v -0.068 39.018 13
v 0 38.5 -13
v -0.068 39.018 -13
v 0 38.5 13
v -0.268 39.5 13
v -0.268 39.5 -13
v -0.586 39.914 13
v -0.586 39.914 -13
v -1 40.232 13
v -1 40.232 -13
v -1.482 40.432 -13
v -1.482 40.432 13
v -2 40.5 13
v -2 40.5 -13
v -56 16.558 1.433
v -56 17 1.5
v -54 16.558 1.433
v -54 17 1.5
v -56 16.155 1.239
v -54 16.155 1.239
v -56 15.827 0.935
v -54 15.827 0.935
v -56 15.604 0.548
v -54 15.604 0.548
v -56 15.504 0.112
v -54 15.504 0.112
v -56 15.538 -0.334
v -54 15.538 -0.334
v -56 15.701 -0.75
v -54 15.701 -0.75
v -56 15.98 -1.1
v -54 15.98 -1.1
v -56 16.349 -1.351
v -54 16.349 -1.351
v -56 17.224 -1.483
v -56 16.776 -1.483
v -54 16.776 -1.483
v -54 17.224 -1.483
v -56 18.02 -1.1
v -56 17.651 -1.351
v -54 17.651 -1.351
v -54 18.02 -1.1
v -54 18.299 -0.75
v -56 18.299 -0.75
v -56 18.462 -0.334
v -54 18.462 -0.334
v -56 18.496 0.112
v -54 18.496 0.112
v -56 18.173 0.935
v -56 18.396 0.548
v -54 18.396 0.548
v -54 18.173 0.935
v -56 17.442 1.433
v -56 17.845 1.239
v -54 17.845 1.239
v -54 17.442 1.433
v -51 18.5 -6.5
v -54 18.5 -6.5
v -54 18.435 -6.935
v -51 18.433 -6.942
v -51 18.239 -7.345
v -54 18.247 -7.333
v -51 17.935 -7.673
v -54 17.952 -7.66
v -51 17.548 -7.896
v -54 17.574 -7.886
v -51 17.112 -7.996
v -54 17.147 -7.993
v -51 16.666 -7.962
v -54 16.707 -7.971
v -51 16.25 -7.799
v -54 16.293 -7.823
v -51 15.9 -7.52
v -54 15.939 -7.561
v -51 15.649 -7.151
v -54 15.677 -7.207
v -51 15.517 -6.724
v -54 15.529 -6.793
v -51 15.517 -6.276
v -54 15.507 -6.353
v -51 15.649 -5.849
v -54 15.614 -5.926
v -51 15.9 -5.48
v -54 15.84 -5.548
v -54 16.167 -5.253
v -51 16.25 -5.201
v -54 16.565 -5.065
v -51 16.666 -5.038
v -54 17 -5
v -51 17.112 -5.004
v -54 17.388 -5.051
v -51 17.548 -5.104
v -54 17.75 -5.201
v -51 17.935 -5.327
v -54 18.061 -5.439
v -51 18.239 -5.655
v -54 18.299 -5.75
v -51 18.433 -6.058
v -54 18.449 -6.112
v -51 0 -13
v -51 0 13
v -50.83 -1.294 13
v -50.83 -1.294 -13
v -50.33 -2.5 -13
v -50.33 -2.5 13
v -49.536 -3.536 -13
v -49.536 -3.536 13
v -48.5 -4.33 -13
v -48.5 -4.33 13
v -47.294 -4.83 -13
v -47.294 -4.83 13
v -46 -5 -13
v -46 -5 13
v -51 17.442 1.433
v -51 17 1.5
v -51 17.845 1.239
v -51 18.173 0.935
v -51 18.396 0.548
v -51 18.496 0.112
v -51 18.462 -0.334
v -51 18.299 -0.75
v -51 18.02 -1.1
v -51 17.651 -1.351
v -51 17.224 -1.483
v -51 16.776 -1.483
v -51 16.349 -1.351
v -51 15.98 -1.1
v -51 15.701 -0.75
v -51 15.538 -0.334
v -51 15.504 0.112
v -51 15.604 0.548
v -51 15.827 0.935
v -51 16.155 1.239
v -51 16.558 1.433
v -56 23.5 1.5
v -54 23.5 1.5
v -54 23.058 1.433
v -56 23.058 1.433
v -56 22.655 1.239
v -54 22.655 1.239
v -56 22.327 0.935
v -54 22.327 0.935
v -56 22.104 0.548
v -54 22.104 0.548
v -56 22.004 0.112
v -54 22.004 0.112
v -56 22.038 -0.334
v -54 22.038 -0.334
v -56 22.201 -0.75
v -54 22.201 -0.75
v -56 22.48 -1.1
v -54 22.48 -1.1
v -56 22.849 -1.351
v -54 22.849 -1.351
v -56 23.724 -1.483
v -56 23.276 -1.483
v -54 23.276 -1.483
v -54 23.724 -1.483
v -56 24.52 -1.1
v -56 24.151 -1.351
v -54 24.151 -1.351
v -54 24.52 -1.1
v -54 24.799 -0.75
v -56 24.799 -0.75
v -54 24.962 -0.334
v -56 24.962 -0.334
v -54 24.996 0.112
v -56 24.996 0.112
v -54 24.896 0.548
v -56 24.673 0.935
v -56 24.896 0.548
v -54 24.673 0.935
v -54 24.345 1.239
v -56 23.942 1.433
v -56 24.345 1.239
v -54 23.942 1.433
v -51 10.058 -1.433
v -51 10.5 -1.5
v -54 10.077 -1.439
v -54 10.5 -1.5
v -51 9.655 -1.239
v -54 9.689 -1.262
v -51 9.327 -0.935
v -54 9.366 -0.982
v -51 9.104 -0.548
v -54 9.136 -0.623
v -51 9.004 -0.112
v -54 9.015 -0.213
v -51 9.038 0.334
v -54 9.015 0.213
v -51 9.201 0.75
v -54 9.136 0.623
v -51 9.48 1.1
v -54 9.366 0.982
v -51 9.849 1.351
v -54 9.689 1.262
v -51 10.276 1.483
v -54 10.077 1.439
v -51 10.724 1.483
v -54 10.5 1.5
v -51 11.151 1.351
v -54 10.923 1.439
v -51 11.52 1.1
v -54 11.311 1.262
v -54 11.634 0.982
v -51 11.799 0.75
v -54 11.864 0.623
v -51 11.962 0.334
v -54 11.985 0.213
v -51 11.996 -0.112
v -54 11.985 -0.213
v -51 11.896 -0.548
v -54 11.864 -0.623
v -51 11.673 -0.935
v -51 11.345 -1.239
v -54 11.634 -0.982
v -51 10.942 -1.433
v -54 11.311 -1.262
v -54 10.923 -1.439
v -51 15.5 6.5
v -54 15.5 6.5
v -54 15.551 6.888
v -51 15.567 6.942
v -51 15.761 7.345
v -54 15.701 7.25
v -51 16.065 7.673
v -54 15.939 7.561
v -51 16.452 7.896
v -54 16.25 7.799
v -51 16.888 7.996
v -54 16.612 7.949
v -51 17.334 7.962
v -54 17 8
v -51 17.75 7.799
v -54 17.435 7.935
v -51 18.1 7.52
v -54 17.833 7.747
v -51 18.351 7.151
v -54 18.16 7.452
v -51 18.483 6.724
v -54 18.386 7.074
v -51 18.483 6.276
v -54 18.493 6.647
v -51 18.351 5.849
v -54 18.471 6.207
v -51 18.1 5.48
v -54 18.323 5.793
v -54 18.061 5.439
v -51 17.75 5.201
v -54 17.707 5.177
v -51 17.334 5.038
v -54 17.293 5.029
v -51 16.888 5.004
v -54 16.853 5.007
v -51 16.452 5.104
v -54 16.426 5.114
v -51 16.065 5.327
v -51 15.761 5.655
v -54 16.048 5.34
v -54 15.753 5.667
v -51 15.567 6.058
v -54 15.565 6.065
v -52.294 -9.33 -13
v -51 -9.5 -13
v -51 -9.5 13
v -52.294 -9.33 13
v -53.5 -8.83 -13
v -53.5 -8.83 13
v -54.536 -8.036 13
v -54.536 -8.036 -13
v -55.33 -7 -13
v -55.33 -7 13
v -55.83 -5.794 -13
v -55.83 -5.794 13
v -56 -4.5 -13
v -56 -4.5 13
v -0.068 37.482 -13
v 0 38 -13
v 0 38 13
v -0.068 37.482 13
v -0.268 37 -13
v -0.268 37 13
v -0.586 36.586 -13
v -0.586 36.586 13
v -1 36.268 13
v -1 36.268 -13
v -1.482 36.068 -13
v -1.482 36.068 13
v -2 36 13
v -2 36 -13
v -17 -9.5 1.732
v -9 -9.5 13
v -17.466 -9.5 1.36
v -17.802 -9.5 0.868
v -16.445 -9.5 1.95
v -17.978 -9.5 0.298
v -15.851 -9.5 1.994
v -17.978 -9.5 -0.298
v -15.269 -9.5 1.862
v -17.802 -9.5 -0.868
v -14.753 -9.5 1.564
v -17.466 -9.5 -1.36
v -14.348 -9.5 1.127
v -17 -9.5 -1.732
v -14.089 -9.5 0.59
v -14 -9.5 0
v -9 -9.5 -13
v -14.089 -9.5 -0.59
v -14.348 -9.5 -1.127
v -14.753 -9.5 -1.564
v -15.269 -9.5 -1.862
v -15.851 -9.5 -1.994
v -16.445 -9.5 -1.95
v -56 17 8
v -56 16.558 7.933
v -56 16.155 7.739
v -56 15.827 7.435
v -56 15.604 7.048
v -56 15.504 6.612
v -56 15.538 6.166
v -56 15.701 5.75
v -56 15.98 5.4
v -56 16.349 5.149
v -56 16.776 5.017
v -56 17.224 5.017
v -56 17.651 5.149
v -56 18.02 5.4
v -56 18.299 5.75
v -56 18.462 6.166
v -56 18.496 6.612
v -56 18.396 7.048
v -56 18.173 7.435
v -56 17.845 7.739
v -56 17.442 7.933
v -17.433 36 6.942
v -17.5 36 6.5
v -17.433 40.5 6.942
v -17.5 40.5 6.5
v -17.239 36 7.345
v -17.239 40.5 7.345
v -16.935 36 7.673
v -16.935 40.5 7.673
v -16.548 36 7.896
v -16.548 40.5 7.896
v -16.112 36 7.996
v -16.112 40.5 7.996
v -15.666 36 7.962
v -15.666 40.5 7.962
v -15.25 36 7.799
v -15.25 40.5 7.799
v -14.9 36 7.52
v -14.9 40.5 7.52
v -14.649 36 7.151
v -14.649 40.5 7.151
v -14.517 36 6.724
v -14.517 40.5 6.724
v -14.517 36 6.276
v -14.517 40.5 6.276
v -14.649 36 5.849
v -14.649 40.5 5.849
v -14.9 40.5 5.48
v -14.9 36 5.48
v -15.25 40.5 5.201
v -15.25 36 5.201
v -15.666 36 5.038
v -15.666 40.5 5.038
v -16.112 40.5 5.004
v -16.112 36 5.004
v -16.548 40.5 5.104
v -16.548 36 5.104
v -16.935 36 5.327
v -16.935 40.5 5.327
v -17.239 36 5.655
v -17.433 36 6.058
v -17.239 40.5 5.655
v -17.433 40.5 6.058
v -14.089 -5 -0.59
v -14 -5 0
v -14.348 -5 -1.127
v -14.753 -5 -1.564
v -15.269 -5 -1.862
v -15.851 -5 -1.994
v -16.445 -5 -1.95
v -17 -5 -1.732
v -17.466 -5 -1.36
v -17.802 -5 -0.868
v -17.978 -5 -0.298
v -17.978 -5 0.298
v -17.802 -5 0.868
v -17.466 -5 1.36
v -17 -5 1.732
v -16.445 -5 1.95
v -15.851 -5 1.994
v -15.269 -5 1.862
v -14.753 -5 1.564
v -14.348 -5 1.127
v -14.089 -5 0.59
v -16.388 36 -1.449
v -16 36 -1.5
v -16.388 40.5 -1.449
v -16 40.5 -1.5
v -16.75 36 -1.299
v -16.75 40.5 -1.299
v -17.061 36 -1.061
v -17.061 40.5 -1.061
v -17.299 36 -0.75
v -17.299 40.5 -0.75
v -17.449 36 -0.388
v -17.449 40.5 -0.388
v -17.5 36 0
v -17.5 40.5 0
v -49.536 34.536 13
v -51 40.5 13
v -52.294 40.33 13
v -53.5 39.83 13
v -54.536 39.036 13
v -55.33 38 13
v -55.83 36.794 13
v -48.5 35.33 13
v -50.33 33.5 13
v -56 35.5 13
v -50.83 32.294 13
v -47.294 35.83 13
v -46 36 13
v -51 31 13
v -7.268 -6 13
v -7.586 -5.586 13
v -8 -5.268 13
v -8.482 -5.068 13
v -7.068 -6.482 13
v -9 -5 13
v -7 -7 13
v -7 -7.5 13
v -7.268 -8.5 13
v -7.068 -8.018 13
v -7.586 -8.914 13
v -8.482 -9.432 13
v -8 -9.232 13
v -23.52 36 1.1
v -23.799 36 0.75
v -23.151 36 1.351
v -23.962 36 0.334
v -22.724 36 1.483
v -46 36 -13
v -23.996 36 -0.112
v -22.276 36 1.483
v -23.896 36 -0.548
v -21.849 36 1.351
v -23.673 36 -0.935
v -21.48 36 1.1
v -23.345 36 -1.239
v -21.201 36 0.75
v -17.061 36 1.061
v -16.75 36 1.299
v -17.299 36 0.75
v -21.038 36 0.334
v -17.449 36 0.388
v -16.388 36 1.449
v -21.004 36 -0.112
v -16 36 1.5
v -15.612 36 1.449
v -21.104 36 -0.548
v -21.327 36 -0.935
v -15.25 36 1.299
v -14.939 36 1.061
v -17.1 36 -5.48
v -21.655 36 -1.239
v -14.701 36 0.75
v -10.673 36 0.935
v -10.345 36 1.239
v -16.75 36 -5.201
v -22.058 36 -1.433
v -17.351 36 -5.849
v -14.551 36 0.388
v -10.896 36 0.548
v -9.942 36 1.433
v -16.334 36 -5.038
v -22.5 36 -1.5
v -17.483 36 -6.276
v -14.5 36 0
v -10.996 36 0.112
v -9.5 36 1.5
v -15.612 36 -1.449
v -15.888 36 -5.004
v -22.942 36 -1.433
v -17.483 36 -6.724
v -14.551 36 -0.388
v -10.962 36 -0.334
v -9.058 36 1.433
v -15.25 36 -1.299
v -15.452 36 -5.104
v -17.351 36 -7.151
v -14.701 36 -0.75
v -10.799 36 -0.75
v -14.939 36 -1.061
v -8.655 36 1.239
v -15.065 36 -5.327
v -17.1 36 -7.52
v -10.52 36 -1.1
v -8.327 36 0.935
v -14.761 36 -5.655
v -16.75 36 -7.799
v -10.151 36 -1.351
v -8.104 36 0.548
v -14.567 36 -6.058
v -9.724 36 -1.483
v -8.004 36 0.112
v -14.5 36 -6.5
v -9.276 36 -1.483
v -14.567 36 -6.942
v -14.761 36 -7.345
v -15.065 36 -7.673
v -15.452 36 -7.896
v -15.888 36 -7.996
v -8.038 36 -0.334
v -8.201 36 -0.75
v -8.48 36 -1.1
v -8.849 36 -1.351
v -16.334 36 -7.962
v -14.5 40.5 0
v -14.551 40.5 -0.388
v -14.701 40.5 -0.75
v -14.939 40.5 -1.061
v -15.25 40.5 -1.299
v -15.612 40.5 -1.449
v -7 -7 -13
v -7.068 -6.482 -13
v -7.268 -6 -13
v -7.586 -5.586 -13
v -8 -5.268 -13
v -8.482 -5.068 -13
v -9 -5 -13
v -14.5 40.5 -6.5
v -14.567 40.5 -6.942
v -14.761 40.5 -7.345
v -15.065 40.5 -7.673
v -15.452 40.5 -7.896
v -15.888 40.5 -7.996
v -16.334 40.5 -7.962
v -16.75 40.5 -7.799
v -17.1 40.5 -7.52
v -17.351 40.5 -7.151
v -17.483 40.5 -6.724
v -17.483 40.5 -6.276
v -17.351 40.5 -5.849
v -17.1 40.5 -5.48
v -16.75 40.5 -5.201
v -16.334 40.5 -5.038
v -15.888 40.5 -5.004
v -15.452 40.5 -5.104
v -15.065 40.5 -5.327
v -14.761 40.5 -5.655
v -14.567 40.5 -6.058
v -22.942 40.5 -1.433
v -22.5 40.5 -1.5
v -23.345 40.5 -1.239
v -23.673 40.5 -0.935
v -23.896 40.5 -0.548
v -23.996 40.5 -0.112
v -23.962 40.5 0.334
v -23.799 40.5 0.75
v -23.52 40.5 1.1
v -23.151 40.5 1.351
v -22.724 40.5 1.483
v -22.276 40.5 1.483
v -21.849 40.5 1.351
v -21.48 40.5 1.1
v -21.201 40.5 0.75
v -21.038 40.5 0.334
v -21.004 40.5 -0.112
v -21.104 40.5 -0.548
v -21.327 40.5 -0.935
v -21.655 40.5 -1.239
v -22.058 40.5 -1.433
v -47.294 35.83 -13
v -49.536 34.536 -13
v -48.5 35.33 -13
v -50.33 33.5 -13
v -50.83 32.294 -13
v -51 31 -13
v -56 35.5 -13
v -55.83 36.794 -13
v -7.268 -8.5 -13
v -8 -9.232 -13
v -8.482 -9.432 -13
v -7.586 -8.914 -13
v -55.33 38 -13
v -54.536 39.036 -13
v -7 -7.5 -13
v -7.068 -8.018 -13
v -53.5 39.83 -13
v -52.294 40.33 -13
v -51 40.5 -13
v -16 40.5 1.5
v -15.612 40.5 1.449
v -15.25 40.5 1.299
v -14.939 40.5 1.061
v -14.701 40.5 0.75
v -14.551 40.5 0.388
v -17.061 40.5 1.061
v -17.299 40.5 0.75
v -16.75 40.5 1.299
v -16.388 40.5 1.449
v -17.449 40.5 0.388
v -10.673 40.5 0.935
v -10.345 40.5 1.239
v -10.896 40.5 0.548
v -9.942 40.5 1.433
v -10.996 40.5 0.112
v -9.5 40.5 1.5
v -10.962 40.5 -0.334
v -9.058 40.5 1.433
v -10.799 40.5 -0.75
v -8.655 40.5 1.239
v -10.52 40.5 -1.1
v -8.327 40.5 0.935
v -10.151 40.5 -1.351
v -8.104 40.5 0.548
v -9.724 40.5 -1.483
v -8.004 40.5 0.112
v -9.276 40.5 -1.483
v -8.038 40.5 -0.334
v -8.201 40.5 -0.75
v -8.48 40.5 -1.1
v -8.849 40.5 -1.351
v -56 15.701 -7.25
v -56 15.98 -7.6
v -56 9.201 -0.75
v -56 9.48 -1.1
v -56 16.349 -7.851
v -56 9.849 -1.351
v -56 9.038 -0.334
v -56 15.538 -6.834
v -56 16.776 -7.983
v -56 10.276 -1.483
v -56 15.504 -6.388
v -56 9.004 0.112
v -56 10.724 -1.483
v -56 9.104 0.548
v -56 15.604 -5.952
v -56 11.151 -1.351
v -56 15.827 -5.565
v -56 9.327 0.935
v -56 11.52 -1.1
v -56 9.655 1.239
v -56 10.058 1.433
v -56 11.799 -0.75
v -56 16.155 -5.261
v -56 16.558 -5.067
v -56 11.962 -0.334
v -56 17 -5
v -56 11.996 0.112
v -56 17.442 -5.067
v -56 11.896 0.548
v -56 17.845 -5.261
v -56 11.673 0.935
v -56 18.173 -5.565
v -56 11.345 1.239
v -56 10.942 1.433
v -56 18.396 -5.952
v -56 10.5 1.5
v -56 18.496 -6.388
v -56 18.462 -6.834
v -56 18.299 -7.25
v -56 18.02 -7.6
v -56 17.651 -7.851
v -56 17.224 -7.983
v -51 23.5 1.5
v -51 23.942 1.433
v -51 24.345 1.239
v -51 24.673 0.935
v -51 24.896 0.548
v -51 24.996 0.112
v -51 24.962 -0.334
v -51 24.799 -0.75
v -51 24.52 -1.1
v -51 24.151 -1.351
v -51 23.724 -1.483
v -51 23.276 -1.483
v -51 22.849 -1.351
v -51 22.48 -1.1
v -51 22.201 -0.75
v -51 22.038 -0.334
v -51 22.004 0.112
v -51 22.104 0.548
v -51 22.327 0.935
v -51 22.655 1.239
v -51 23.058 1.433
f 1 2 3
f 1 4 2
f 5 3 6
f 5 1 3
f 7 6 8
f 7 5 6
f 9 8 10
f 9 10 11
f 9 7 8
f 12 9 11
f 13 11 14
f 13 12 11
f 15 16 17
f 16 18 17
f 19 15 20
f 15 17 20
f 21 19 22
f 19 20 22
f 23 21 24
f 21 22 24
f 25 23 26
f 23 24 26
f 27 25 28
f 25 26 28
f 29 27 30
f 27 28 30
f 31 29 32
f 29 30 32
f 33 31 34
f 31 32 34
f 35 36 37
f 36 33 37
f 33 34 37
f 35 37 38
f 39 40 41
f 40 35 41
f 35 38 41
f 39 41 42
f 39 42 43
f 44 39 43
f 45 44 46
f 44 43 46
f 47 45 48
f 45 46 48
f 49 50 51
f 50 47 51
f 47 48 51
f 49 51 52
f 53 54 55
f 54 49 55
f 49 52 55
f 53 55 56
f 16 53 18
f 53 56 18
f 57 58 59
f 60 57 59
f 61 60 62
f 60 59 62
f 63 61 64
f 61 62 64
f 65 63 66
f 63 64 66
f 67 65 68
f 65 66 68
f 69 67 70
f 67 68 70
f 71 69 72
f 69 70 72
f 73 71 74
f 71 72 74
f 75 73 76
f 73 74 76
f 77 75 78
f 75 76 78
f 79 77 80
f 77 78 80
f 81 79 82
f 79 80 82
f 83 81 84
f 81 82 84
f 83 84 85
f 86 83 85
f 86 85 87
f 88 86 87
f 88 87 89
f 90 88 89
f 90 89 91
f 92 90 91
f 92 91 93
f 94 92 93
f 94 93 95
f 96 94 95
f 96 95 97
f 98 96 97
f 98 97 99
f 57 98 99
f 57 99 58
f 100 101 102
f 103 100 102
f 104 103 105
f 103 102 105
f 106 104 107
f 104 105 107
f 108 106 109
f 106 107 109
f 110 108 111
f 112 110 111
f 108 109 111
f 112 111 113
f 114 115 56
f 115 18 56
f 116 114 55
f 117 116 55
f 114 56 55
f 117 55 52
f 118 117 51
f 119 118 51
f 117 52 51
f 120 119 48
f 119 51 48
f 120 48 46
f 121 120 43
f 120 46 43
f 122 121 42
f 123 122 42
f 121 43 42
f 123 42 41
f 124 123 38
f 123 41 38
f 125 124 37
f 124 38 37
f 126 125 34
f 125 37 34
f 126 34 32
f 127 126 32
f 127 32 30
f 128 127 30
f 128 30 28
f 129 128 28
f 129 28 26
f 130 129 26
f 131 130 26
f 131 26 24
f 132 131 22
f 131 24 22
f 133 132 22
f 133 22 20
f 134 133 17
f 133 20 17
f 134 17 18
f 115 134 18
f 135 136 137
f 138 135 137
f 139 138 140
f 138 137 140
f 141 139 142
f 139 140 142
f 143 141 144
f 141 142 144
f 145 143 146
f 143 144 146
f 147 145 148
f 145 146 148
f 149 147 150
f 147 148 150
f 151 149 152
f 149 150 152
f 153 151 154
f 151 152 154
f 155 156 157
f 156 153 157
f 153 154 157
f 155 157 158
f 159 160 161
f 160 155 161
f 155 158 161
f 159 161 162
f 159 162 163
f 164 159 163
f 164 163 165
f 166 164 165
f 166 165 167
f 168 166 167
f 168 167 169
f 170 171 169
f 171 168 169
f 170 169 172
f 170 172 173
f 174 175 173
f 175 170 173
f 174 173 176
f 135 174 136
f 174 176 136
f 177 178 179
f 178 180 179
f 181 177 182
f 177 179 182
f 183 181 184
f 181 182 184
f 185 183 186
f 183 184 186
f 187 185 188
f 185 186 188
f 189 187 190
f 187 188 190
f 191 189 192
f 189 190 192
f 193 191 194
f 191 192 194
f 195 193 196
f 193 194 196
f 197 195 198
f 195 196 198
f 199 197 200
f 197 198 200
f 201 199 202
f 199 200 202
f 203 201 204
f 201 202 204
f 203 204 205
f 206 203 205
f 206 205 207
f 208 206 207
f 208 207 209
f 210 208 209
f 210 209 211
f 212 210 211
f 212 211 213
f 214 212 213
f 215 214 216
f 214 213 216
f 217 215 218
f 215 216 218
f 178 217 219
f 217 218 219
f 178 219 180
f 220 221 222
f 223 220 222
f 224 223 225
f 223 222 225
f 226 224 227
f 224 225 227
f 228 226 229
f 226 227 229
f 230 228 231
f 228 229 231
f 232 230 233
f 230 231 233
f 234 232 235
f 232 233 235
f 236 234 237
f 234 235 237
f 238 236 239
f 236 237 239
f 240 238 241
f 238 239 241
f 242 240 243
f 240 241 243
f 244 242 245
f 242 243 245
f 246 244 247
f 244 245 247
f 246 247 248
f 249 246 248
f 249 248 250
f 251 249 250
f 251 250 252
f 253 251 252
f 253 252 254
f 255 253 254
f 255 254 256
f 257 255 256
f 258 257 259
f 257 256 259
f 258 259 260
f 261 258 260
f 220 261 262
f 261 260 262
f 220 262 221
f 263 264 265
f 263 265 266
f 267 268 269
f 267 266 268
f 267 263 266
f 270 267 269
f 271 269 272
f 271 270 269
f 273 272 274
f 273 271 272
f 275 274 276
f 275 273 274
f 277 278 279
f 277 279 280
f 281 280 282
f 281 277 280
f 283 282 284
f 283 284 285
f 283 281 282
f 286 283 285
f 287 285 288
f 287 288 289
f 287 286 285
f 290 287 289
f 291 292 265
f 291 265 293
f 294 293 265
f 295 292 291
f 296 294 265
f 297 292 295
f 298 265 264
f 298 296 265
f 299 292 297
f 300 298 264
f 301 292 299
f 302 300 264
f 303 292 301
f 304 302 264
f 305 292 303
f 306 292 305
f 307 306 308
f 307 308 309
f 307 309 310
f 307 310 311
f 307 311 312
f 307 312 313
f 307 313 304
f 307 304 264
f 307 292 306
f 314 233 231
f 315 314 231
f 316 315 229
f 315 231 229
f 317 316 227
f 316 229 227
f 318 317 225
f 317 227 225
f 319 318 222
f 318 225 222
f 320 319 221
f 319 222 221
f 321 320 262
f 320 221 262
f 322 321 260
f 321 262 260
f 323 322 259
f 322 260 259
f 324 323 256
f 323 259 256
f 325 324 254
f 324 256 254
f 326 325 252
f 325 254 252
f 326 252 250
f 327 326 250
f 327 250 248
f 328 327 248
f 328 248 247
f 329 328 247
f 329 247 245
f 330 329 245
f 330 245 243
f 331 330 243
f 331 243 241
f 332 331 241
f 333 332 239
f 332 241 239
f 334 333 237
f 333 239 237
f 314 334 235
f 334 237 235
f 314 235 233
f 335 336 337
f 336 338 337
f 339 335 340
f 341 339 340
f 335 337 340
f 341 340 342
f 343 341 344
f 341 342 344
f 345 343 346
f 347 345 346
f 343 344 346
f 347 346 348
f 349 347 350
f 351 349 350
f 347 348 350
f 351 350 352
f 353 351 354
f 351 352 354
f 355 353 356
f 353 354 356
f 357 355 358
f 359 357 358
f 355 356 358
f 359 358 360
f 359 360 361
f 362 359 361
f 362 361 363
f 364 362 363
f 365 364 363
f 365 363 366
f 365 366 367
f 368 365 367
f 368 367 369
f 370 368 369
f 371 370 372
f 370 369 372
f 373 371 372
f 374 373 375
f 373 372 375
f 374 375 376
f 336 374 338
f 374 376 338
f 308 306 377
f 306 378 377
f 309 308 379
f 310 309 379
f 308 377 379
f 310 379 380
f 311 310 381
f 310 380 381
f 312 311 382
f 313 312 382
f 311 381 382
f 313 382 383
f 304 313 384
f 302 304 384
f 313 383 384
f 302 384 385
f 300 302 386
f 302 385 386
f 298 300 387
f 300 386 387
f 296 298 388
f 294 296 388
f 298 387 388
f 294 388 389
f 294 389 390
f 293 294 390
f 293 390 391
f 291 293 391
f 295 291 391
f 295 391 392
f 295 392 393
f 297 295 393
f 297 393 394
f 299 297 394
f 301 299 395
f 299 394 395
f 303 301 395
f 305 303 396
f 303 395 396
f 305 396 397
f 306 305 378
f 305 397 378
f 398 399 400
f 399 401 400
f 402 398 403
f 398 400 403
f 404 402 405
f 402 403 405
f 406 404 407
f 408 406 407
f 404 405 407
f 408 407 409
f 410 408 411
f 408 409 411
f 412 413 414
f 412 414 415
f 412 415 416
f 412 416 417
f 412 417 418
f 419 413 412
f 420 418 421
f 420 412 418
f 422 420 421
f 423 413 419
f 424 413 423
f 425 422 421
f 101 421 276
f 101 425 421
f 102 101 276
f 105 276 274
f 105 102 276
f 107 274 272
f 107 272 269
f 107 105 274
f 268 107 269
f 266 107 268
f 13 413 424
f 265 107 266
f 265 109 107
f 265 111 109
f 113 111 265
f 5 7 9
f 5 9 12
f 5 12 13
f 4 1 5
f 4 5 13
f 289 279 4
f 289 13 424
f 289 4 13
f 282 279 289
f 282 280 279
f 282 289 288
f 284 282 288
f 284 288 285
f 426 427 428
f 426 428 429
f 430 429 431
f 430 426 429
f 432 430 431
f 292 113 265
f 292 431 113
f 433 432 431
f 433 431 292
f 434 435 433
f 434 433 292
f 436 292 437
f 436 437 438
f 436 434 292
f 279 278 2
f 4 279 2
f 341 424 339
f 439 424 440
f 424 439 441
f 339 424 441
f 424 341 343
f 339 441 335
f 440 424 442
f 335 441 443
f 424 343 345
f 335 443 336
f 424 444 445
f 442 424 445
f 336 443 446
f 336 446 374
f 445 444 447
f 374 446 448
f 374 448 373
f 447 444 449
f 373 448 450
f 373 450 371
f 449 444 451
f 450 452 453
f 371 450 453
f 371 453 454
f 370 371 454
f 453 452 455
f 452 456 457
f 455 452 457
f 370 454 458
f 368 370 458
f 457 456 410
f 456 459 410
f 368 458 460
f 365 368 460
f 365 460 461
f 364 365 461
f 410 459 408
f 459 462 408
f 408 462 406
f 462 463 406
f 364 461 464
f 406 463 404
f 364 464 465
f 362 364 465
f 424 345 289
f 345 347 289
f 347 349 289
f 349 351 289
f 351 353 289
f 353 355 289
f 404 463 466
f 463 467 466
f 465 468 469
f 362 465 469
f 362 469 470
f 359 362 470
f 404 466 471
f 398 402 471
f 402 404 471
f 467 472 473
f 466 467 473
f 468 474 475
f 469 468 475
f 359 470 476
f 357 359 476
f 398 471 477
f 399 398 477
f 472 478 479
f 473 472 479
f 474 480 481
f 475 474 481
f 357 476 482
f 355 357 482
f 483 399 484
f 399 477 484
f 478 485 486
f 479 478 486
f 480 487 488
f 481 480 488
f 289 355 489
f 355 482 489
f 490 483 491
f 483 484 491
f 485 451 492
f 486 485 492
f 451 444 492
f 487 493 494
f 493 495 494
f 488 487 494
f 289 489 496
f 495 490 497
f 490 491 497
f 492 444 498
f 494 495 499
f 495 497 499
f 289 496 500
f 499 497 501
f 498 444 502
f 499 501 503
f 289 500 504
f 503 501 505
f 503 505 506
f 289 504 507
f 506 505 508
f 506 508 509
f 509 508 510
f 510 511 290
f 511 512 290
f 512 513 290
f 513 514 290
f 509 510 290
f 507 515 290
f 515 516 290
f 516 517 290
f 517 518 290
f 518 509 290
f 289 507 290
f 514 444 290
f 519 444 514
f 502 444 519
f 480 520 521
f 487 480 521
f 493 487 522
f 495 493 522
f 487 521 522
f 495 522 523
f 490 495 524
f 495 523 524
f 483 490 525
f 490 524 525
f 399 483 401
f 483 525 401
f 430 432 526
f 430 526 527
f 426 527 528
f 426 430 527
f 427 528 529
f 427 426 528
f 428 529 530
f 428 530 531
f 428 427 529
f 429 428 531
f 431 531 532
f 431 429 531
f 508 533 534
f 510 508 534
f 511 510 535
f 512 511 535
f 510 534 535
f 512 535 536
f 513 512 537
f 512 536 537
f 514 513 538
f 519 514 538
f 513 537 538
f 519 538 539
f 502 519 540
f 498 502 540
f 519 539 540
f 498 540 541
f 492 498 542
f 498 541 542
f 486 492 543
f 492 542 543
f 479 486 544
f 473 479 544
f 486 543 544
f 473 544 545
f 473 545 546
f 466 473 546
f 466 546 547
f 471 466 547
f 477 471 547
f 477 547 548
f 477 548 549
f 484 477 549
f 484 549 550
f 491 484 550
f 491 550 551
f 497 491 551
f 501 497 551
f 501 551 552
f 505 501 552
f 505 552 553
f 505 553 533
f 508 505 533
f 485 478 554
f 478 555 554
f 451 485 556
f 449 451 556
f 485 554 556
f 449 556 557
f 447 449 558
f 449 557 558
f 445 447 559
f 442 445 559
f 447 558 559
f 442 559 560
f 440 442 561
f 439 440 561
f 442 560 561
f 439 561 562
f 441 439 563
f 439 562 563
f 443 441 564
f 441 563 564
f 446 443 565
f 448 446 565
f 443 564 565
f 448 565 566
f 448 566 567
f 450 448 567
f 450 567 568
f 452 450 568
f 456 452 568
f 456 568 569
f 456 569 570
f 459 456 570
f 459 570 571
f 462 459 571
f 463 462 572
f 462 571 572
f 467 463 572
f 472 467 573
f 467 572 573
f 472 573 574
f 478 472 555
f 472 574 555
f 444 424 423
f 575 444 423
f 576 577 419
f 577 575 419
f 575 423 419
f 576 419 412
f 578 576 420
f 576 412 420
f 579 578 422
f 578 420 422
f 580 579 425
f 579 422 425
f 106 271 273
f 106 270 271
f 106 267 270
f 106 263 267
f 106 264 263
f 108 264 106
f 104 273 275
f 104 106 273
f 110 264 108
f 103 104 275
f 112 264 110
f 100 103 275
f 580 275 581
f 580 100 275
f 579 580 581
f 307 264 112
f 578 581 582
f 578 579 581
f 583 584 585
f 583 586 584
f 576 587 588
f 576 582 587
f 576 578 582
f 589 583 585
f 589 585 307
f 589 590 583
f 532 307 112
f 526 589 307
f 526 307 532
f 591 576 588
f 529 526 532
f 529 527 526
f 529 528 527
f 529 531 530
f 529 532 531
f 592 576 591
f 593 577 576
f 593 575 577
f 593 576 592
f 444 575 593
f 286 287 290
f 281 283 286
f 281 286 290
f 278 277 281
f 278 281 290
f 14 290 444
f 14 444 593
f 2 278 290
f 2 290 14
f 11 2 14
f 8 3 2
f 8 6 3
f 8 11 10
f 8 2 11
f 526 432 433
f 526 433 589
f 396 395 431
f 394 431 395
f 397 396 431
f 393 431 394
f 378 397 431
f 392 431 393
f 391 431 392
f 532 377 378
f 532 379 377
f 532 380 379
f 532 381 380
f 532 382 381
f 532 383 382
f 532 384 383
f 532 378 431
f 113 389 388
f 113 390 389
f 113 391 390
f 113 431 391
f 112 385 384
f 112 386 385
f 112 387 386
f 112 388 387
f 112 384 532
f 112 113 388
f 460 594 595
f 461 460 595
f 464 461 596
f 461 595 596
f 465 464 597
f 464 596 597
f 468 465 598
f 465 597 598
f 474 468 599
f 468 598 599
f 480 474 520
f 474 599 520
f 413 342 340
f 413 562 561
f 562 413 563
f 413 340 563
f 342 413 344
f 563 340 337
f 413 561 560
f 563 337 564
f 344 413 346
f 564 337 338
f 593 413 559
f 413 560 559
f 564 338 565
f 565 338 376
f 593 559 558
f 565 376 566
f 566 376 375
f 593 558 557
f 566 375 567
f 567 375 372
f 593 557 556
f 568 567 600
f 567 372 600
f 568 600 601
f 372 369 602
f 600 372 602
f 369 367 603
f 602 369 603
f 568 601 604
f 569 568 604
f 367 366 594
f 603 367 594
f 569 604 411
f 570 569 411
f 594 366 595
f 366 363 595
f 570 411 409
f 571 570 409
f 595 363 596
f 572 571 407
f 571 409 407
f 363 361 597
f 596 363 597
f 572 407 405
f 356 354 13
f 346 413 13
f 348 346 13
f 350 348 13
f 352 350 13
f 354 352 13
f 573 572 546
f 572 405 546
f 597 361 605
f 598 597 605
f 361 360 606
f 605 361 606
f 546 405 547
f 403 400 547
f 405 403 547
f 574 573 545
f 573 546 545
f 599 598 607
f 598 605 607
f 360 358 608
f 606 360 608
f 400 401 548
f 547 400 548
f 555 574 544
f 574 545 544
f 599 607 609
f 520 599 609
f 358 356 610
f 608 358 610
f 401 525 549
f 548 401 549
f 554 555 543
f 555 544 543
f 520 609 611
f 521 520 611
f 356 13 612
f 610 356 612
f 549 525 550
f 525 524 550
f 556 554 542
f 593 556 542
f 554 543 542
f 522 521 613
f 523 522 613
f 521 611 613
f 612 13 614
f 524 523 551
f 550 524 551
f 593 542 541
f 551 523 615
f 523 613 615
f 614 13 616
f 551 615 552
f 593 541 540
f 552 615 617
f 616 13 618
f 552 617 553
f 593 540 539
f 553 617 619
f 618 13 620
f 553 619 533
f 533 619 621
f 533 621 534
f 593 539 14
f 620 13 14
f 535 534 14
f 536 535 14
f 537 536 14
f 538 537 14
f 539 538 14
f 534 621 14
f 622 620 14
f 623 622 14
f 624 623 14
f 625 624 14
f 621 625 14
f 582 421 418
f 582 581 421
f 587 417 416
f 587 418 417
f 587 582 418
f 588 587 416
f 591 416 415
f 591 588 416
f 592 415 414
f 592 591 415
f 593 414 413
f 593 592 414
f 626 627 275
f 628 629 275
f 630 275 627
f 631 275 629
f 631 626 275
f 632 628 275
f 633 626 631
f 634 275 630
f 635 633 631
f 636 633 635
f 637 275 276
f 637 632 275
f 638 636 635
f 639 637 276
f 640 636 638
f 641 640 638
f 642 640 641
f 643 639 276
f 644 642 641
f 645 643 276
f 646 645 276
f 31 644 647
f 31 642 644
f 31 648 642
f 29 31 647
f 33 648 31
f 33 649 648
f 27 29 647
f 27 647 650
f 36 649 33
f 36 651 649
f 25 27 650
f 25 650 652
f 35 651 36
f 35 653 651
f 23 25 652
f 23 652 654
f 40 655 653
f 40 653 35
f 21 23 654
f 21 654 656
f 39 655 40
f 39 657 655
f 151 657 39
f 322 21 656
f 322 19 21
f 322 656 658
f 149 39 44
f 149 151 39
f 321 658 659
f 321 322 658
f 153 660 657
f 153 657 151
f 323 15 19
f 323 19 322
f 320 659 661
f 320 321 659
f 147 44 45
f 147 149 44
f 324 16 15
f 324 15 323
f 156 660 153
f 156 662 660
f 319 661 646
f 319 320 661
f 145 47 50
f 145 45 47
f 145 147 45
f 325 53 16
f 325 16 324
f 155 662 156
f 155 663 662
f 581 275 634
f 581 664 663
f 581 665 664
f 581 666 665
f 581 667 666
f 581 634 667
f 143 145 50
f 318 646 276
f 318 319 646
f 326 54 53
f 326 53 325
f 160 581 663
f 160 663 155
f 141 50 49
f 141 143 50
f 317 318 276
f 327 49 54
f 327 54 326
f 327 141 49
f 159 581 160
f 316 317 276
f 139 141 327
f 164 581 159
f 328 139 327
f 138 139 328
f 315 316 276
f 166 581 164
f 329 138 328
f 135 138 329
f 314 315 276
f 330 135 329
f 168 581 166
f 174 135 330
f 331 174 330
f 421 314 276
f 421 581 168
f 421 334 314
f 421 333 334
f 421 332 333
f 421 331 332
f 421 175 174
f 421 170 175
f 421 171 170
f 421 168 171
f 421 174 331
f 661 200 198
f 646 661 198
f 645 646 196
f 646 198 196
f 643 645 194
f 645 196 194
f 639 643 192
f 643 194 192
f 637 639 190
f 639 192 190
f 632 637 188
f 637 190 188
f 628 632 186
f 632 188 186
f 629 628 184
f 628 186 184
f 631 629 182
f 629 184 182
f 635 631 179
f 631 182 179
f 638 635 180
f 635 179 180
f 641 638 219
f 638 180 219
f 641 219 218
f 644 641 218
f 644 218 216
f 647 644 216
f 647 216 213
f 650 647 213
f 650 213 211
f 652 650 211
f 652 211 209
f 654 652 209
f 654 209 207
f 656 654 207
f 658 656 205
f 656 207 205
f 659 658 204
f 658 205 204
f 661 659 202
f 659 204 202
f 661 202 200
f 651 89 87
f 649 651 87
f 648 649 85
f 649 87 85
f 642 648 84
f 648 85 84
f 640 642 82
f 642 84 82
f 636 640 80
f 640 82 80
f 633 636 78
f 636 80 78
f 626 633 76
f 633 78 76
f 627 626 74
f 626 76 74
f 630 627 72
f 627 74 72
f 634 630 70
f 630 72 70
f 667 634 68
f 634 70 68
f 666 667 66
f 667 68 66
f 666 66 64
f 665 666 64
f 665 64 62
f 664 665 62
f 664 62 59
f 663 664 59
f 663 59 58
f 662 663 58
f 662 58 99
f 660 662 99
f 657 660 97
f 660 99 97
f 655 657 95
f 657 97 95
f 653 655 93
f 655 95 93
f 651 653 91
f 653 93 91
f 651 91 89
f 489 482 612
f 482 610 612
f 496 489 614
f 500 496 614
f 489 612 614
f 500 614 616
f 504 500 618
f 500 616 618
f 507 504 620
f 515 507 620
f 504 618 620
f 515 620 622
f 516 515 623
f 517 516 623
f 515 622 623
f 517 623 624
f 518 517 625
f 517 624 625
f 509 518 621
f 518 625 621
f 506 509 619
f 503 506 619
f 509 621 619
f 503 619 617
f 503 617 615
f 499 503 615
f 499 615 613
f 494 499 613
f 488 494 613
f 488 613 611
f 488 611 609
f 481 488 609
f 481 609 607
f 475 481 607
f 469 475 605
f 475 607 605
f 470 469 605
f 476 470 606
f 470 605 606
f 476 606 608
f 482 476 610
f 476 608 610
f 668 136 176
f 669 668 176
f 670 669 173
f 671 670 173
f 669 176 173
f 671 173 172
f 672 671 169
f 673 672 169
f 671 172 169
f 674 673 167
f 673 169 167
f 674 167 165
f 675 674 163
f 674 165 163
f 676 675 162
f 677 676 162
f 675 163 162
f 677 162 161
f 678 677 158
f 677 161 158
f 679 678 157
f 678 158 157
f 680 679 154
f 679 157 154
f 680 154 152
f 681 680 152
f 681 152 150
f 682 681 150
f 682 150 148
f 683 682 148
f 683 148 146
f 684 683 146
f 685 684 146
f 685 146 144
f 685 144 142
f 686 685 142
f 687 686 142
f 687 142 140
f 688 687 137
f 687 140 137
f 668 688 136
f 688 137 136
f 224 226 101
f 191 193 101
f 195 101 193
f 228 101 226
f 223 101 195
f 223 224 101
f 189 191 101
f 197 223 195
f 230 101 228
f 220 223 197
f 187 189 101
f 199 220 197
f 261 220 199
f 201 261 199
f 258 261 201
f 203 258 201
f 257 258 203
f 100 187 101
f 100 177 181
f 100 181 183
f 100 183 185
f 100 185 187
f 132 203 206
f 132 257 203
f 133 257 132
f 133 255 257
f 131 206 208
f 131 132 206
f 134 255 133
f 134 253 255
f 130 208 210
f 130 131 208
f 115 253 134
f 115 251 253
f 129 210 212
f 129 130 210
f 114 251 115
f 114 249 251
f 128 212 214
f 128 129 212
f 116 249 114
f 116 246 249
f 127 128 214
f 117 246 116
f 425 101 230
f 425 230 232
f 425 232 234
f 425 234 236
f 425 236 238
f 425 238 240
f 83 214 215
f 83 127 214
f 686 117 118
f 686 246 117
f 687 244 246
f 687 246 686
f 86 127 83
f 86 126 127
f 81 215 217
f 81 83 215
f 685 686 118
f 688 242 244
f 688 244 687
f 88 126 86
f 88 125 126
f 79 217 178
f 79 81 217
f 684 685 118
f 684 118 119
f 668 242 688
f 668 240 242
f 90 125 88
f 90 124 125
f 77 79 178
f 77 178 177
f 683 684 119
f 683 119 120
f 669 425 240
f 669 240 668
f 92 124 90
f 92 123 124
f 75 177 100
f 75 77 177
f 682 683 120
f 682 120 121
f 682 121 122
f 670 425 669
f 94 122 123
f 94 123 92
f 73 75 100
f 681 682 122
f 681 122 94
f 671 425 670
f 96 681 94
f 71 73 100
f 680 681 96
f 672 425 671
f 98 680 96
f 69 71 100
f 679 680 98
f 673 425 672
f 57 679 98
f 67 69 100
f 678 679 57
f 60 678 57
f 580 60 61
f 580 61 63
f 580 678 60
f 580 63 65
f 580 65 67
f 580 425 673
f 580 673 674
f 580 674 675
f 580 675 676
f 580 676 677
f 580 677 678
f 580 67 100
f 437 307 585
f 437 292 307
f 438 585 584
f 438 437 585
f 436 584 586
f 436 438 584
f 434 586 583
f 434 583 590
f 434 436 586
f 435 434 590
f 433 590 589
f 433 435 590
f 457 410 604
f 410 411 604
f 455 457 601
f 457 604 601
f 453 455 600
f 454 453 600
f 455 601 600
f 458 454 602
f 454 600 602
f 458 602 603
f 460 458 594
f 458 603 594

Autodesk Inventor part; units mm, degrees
ref_plane "YZ Plane" through (0, 0, 0) normal (1, 0, 0) x (0, 1, 0)
sketch "Sketch1" plane through (0, 0, 0) normal (0, 0, 1) x (1, 0, 0)
  line L0 (0, 0) -> (-51, 0)
  line L1 (-51, 0) -> (-51, 18)
  line L2 (-51, 18) -> (0, 18) construction
  line L3 (-51, 18) -> (-54, 18)
  line L4 (-54, 18) -> (-54, -3)
  line L5 (-54, -3) -> (0, -3)
  line L6 (0, -3) -> (0, 0)
  dimension "d0" = 18
  dimension "d1" = 3
  dimension "d2" = 3
  dimension "d3" = 54
extrude "Extrusion1" add sketch "Sketch1" along normal blind 10
mirror "Mirror1" about plane through (-33.12, 1.38, 0) normal (0, 0, -1) of "Extrusion1"
mirror "Mirror2" about plane through (-51, 18, 0) normal (0, 1, 0) of "Extrusion1", "Mirror1"
sketch "Sketch4" plane through (0, -3, -10) normal (0, 0, -1) x (-1, 0, 0)
  line L0 (0, 3) -> (51, 3) projected
  line L1 (0, 0) -> (0, 3) projected
  line L2 (54, 0) -> (0, 0) projected
  line L3 (54, 42) -> (54, 0) projected
  line L4 (54, 42) -> (0, 42) projected
  line L5 (0, 42) -> (0, 39) projected
  line L6 (0, 39) -> (51, 39) projected
  line L7 (51, 39) -> (51, 3) projected
  line L8 (0, 3) -> (51, 3) projected
  line L9 (0, 0) -> (0, 3) projected
  line L10 (54, 0) -> (0, 0) projected
  line L11 (54, 42) -> (54, 0) projected
  line L12 (54, 42) -> (0, 42) projected
  line L13 (0, 42) -> (0, 39) projected
  line L14 (0, 39) -> (51, 39) projected
  line L15 (51, 39) -> (51, 3) projected
extrude "Extrusion4" add sketch "Sketch4" along normal blind 5
mirror "Mirror3" about plane through (0, 0, 0) normal (0, 0, 1) of "Extrusion4"
sketch "Sketch11" plane through (-54, -3, -15) normal (0, -1, 0) x (1, 0, 0)
  line L0 (54, 0) -> (54, 30) projected
  line L1 (54, 30) -> (0, 30) projected
  line L2 (0, 0) -> (0, 30) projected
  line L3 (54, 0) -> (0, 0) projected
  line L4 (54, 0) -> (54, 30) projected
  line L5 (54, 30) -> (0, 30) projected
  line L6 (0, 0) -> (0, 30) projected
  line L7 (54, 0) -> (0, 0) projected
  point P0 (54, 15)
extrude "Extrusion11" cut sketch "Sketch11" against normal blind 10
sketch "Sketch13" plane through (0, 36, -15) normal (1, 0, 0) x (0, 0, -1)
  line L0 (-30, 3) -> (-28, 3)
  line L1 (-28, 3) -> (-28, -29)
  line L2 (-28, -29) -> (-30, -29)
  line L3 (-30, -29) -> (-30, 3)
  line L4 (-30, -29) -> (0, -29) projected
  point P0 (-15, -36)
  dimension "d65" = 2
extrude "Extrusion13" cut sketch "Sketch13" against normal up to next
mirror "Mirror4" about plane through (0, 0, 0) normal (0, 0, 1) of "Extrusion13"
sketch "Sketch14" plane through (-54, 7, 13) normal (-1, 0, 0) x (0, 0, 1)
  line L0 (-26, 32) -> (-26, 0) projected
  line L1 (-26, 0) -> (0, 0) projected
  line L2 (0, 32) -> (-26, 32) projected
  circle A0 centre (-13, 10) radius 6.5 construction
  line L3 (-13, 10) -> (-26, 10) construction
  line L4 (-13, 10) -> (-13, 32) construction
  circle A1 centre (-13, 10) radius 1.5
  circle A2 centre (-13, 16.5) radius 1.5
  point P0 (-13, -7)
  point P1 (-13, 0)
  dimension "d68" = 13
  dimension "d69" = 22
  dimension "d71" = 3
  dimension "d72" = 3
extrude "Extrusion14" cut sketch "Sketch14" against normal up to next
pattern_circular "Circular Pattern6" count 4 over 360 about axis through (-54, 17, 0) along (1, 0, 0) of "Extrusion14"
sketch "Sketch15" plane through (-51, 36, 13) normal (0, -1, 0) x (1, 0, 0)
  line L0 (51, -26) -> (51, 0) projected
  line L1 (51, 0) -> (0, 0) projected
  circle A0 centre (35, -13) radius 6.5 construction
  line L2 (35, -13) -> (35, 0) construction
  circle A1 centre (35, -6.5) radius 1.5
  circle A2 centre (35, -13) radius 1.5
  point P0 (51, -13)
  point P1 (51, -13)
  dimension "d78" = 13
  dimension "d79" = 16
  dimension "d80" = 3
  dimension "d81" = 3
extrude "Extrusion15" cut sketch "Sketch15" against normal up to next
pattern_circular "Circular Pattern7" count 4 over 360 about axis through (-16, 36, 0) along (0, 1, 0) of "Extrusion15"
sketch "Sketch16" plane through (-54, 7, -15) normal (0, -1, 0) x (1, 0, 0)
  line L0 (0, 2) -> (3, 2) projected
  line L1 (3, 28) -> (3, 2) projected
  line L2 (3, 28) -> (0, 28) projected
  line L3 (0, 2) -> (0, 28) projected
  line L4 (0, 2) -> (3, 2) projected
  line L5 (3, 28) -> (3, 2) projected
  line L6 (3, 28) -> (0, 28) projected
  line L7 (0, 2) -> (0, 28) projected
  point P0 (54, 15)
extrude "Extrusion16" add sketch "Sketch16" along normal blind 14
ref_plane "Work Plane1" through (-47, 34, 13) normal (1, 0, 0) x (0, 0, -1)
sketch "Sketch17" plane through (-47, 34, 13) normal (1, 0, 0) x (0, 0, -1)
  line L0 (0, 0) -> (0, -41) projected
  line L1 (26, -41) -> (0, -41)
  line L2 (0, -41) -> (0, -39)
  line L3 (0, -39) -> (26, -39)
  line L4 (26, -39) -> (26, -41)
  point P0 (13, -34)
  dimension "d92" = 2
extrude "Extrusion17" add sketch "Sketch17" along normal blind 40
ref_plane "Work Plane3" through (-47, -5, 13) normal (0, 1, 0) x (1, 0, 0)
sketch "Sketch18" plane through (-47, -5, 13) normal (0, 1, 0) x (1, 0, 0)
  circle A0 centre (31, 13) radius 1.5 projected
  circle A1 centre (31, 13) radius 2
  point P0 (47, 13)
  dimension "d95" = 4
extrude "Extrusion18" cut sketch "Sketch18" against normal up to next contours A0 | A1
sketch "Sketch23" plane through (0, 36, 13) normal (0, 0, 1) x (1, 0, 0)
  line L0 (0, 0) -> (-51, 0) projected
  line L1 (-54, 3) -> (0, 3) projected
  line L2 (-54, -43) -> (-54, 3) projected
  line L3 (-7, -43) -> (-54, -43) projected
  line L4 (-47, -41) -> (-7, -41) projected
  line L5 (-51, 0) -> (-51, -43) projected
  line L6 (0, 0) -> (-51, 0) projected
  line L7 (0, 3) -> (0, 0) projected
  line L8 (-54, 3) -> (0, 3) projected
  line L9 (-54, -43) -> (-54, 3) projected
  line L10 (-51, -43) -> (-54, -43) projected
  line L11 (0, 0) -> (-54, 0)
  line L12 (-54, 0) -> (-54, 4.5)
  line L13 (-54, 4.5) -> (0, 4.5)
  line L14 (0, 4.5) -> (0, 0)
  line L15 (-7, -41) -> (-54, -41)
  line L16 (-54, -41) -> (-54, -45.5)
  line L17 (-54, -45.5) -> (-7, -45.5)
  line L18 (-7, -45.5) -> (-7, -41)
  point P0 (0, -36)
  dimension "d110" = 3
  dimension "d111" = 2
  dimension "d112" = 1.5
  dimension "d113" = 2.5
sketch "Sketch24" plane through (-54, 39, 13) normal (0, 1, 0) x (1, 0, 0)
  circle A0 centre (38, 19.5) radius 1.5 projected
  circle A1 centre (44.5, 13) radius 1.5 projected
  circle A2 centre (31.5, 13) radius 1.5 projected
  circle A3 centre (38, 6.5) radius 1.5 projected
  circle A4 centre (38, 13) radius 1.5 projected
  line L0 (54, 26) -> (0, 26) projected
  line L1 (0, 0) -> (0, 26) projected
  line L2 (0, 0) -> (54, 0) projected
  line L3 (54, 0) -> (54, 26) projected
  point P0 (54, 13)
  dimension "d114" = 26
extrude "Extrusion22" add sketch "Sketch23" against normal up to surface (26 mm away) contours L0 L11 L2 L1 L7 | L1 L12 L13 L14 | L15 L4 L18 L3 L5 | L5 L3 L2 L15 | L3 L18 L17 L16
sketch "Sketch25" plane through (-51, 36, 13) normal (0, 0, 1) x (1, 0, 0)
  line L0 (-3, 4.5) -> (-3, -45.5) projected
  line L1 (-3, -45.5) -> (44, -45.5) projected
  line L2 (44, -41) -> (44, -45.5) projected
  line L3 (44, -41) -> (0, -41) projected
  line L4 (0, 0) -> (0, -41) projected
  line L5 (51, 0) -> (0, 0) projected
  line L6 (51, 4.5) -> (51, 0) projected
  line L7 (51, 4.5) -> (-3, 4.5) projected
  point P0 (51, -36)
  dimension "d117" = 3
sketch "Sketch26" plane through (-54, -9.5, -13) normal (-1, 0, 0) x (0, 0, 1)
  line L0 (0, 0) -> (0, 50) projected
  line L1 (26, 0) -> (0, 0) projected
  line L2 (26, 50) -> (26, 0) projected
  line L3 (26, 50) -> (0, 50) projected
  circle A0 centre (13, 20) radius 1.5 projected
  circle A1 centre (19.5, 26.5) radius 1.5 projected
  circle A2 centre (6.5, 26.5) radius 1.5 projected
  circle A3 centre (13, 26.5) radius 1.5 projected
  circle A4 centre (13, 33) radius 1.5 projected
  line L4 (0, 0) -> (0, 50) projected
  line L5 (26, 0) -> (0, 0) projected
  line L6 (26, 50) -> (26, 0) projected
  circle A5 centre (13, 20) radius 1.5 projected
  circle A6 centre (19.5, 26.5) radius 1.5 projected
  circle A7 centre (6.5, 26.5) radius 1.5 projected
  circle A8 centre (13, 26.5) radius 1.5 projected
  circle A9 centre (13, 33) radius 1.5 projected
  line L7 (26, 50) -> (0, 50) projected
  point P0 (13, 9.5)
extrude "Extrusion23" add sketch "Sketch26" along normal blind 2
sketch "Sketch27" plane through (0, 40.5, 13) normal (0, 1, 0) x (1, 0, 0)
  line L0 (-56, 26) -> (0, 26) projected
  line L1 (0, 0) -> (0, 26) projected
  circle A0 centre (-16, 13) radius 6.5 construction
  circle A1 centre (-16, 19.5) radius 1.5
  circle A2 centre (-16, 13) radius 1.5
  line L2 (-16, 13) -> (0, 13) construction
  line L3 (-16, 13) -> (-16, 26) construction
  dimension "d121" = 13
  dimension "d120" = 3
  dimension "d122" = 3
  dimension "d123" = 16
extrude "Extrusion24" cut sketch "Sketch27" against normal up to surface (4.5 mm away)
pattern_circular "Circular Pattern8" count 4 over 360 about axis through (-16, 40.5, 0) along (0, -1, 0) of "Extrusion24"
sketch "Sketch28" plane through (-51, -5, 13) normal (0, 1, 0) x (1, 0, 0)
  circle A0 centre (35, 13) radius 1.5 projected
  circle A1 centre (35, 13) radius 2
  point P0 (51, 13)
  dimension "d129" = 4
extrude "Extrusion25" cut sketch "Sketch28" against normal up to next contours A0 | A1
fillet "Fillet9" radius 2 4 edges at (-7, -5, 0) (-7, -9.5, 0) (0, 40.5, 0) (0, 36, 0)
fillet "Fillet10" radius 5 2 edges at (-51, -5, 0) (-51, 36, 0)
fillet "Fillet11" radius 5 2 edges at (-56, -9.5, 0) (-56, 40.5, 0)
sketch "Sketch29" plane through (-2, 40.5, 13) normal (0, 1, 0) x (1, 0, 0)
  circle A0 centre (-14, 6.5) radius 1.5 projected
  circle A1 centre (-7.5, 13) radius 1.5 projected
  circle A2 centre (-20.5, 13) radius 1.5 projected
  circle A3 centre (-14, 19.5) radius 1.5 projected
  circle A4 centre (-14, 13) radius 1.5 projected
  line L0 (-49, 0) -> (-49, 26) projected
  line L1 (0, 0) -> (-49, 0) projected
  line L2 (0, 26) -> (0, 0) projected
  line L3 (-49, 26) -> (0, 26) projected
  line L4 (-62.85, -6.77) -> (-67.62, -6.77) projected
  line L5 (-117.21, -13.16) -> (-119.57, -13.16) projected
  point P0 (2, 13)
  point P1 (-65.235, -6.77)
  point P2 (-118.39, -13.16)
  dimension "d135" = 51.235
  dimension "d136" = 104.39
  dimension "d137" = 53.155
sketch "Sketch30" plane through (-46, 36, 13) normal (0, 0, 1) x (1, 0, 0)
  arc A0 (-5, 4.5) -> (-10, -0.5) centre (-5, -0.5) ccw projected
  line L0 (-10, -40.5) -> (-10, -0.5) projected
  arc A1 (-10, -40.5) -> (-5, -45.5) centre (-5, -40.5) ccw projected
  line L1 (-5, -45.5) -> (37, -45.5) projected
  arc A2 (37, -45.5) -> (39, -43.5) centre (37, -43.5) ccw projected
  line L2 (39, -43) -> (39, -43.5) projected
  arc A3 (39, -43) -> (37, -41) centre (37, -43) ccw projected
  line L3 (37, -41) -> (0, -41) projected
  arc A4 (-5, -36) -> (0, -41) centre (0, -36) ccw projected
  line L4 (-5, -5) -> (-5, -36) projected
  arc A5 (0, 0) -> (-5, -5) centre (0, -5) ccw projected
  line L5 (44, 0) -> (0, 0) projected
  arc A6 (44, 0) -> (46, 2) centre (44, 2) ccw projected
  line L6 (46, 2.5) -> (46, 2) projected
  arc A7 (46, 2.5) -> (44, 4.5) centre (44, 2.5) ccw projected
  line L7 (44, 4.5) -> (-5, 4.5) projected
  circle A8 centre (-21.235, -24.295) radius 1.5 projected
  circle A9 centre (-74.39, -26.06) radius 1.5 projected
  line L8 (28.82, -7.86) -> (31.18, -7.86) projected
  point P0 (46, -36)
  point P1 (30, -7.86)
  dimension "d138" = 51.235
  dimension "d139" = 104.39
  dimension "d140" = 53.155
sketch "Sketch31" plane through (-2, 40.5, 13) normal (0, 1, 0) x (1, 0, 0)
  circle A0 centre (-14, 6.5) radius 1.5 projected
  circle A1 centre (-7.5, 13) radius 1.5 projected
  circle A2 centre (-20.5, 13) radius 1.5 projected
  circle A3 centre (-14, 19.5) radius 1.5 projected
  circle A4 centre (-14, 13) radius 1.5 projected
  line L0 (-49, 0) -> (-49, 26) projected
  line L1 (0, 0) -> (-49, 0) projected
  line L2 (0, 26) -> (0, 0) projected
  line L3 (-49, 26) -> (0, 26) projected
  line L4 (-233.9534, -25.52) -> (-233.9534, -21.02)
  point P0 (2, 13)
  point P1 (-118.39, -13.16)
  point P2 (-118.39, -13.16)
  dimension "d141" = 115.5634
sketch "Sketch32" plane through (-46, 36, 13) normal (0, 0, 1) x (1, 0, 0)
  arc A0 (-5, 4.5) -> (-10, -0.5) centre (-5, -0.5) ccw projected
  line L0 (-10, -40.5) -> (-10, -0.5) projected
  arc A1 (-10, -40.5) -> (-5, -45.5) centre (-5, -40.5) ccw projected
  line L1 (-5, -45.5) -> (37, -45.5) projected
  arc A2 (37, -45.5) -> (39, -43.5) centre (37, -43.5) ccw projected
  line L2 (39, -43) -> (39, -43.5) projected
  arc A3 (39, -43) -> (37, -41) centre (37, -43) ccw projected
  line L3 (37, -41) -> (0, -41) projected
  arc A4 (-5, -36) -> (0, -41) centre (0, -36) ccw projected
  line L4 (-5, -5) -> (-5, -36) projected
  arc A5 (0, 0) -> (-5, -5) centre (0, -5) ccw projected
  line L5 (44, 0) -> (0, 0) projected
  arc A6 (44, 0) -> (46, 2) centre (44, 2) ccw projected
  line L6 (46, 2.5) -> (46, 2) projected
  arc A7 (46, 2.5) -> (44, 4.5) centre (44, 2.5) ccw projected
  line L7 (44, 4.5) -> (-5, 4.5) projected
  arc A8 (-187.9273, -23.2225) -> (-187.9273, -28.8975) centre (-186.9534, -26.06) ccw projected
  circle A9 centre (-74.39, -26.06) radius 1.18 projected
  point P0 (46, -36)
  point P1 (-189.9534, -26.06)
  dimension "d142" = 115.563
equation "\"d72\" = d71"
properties part number "C_MARK3"
